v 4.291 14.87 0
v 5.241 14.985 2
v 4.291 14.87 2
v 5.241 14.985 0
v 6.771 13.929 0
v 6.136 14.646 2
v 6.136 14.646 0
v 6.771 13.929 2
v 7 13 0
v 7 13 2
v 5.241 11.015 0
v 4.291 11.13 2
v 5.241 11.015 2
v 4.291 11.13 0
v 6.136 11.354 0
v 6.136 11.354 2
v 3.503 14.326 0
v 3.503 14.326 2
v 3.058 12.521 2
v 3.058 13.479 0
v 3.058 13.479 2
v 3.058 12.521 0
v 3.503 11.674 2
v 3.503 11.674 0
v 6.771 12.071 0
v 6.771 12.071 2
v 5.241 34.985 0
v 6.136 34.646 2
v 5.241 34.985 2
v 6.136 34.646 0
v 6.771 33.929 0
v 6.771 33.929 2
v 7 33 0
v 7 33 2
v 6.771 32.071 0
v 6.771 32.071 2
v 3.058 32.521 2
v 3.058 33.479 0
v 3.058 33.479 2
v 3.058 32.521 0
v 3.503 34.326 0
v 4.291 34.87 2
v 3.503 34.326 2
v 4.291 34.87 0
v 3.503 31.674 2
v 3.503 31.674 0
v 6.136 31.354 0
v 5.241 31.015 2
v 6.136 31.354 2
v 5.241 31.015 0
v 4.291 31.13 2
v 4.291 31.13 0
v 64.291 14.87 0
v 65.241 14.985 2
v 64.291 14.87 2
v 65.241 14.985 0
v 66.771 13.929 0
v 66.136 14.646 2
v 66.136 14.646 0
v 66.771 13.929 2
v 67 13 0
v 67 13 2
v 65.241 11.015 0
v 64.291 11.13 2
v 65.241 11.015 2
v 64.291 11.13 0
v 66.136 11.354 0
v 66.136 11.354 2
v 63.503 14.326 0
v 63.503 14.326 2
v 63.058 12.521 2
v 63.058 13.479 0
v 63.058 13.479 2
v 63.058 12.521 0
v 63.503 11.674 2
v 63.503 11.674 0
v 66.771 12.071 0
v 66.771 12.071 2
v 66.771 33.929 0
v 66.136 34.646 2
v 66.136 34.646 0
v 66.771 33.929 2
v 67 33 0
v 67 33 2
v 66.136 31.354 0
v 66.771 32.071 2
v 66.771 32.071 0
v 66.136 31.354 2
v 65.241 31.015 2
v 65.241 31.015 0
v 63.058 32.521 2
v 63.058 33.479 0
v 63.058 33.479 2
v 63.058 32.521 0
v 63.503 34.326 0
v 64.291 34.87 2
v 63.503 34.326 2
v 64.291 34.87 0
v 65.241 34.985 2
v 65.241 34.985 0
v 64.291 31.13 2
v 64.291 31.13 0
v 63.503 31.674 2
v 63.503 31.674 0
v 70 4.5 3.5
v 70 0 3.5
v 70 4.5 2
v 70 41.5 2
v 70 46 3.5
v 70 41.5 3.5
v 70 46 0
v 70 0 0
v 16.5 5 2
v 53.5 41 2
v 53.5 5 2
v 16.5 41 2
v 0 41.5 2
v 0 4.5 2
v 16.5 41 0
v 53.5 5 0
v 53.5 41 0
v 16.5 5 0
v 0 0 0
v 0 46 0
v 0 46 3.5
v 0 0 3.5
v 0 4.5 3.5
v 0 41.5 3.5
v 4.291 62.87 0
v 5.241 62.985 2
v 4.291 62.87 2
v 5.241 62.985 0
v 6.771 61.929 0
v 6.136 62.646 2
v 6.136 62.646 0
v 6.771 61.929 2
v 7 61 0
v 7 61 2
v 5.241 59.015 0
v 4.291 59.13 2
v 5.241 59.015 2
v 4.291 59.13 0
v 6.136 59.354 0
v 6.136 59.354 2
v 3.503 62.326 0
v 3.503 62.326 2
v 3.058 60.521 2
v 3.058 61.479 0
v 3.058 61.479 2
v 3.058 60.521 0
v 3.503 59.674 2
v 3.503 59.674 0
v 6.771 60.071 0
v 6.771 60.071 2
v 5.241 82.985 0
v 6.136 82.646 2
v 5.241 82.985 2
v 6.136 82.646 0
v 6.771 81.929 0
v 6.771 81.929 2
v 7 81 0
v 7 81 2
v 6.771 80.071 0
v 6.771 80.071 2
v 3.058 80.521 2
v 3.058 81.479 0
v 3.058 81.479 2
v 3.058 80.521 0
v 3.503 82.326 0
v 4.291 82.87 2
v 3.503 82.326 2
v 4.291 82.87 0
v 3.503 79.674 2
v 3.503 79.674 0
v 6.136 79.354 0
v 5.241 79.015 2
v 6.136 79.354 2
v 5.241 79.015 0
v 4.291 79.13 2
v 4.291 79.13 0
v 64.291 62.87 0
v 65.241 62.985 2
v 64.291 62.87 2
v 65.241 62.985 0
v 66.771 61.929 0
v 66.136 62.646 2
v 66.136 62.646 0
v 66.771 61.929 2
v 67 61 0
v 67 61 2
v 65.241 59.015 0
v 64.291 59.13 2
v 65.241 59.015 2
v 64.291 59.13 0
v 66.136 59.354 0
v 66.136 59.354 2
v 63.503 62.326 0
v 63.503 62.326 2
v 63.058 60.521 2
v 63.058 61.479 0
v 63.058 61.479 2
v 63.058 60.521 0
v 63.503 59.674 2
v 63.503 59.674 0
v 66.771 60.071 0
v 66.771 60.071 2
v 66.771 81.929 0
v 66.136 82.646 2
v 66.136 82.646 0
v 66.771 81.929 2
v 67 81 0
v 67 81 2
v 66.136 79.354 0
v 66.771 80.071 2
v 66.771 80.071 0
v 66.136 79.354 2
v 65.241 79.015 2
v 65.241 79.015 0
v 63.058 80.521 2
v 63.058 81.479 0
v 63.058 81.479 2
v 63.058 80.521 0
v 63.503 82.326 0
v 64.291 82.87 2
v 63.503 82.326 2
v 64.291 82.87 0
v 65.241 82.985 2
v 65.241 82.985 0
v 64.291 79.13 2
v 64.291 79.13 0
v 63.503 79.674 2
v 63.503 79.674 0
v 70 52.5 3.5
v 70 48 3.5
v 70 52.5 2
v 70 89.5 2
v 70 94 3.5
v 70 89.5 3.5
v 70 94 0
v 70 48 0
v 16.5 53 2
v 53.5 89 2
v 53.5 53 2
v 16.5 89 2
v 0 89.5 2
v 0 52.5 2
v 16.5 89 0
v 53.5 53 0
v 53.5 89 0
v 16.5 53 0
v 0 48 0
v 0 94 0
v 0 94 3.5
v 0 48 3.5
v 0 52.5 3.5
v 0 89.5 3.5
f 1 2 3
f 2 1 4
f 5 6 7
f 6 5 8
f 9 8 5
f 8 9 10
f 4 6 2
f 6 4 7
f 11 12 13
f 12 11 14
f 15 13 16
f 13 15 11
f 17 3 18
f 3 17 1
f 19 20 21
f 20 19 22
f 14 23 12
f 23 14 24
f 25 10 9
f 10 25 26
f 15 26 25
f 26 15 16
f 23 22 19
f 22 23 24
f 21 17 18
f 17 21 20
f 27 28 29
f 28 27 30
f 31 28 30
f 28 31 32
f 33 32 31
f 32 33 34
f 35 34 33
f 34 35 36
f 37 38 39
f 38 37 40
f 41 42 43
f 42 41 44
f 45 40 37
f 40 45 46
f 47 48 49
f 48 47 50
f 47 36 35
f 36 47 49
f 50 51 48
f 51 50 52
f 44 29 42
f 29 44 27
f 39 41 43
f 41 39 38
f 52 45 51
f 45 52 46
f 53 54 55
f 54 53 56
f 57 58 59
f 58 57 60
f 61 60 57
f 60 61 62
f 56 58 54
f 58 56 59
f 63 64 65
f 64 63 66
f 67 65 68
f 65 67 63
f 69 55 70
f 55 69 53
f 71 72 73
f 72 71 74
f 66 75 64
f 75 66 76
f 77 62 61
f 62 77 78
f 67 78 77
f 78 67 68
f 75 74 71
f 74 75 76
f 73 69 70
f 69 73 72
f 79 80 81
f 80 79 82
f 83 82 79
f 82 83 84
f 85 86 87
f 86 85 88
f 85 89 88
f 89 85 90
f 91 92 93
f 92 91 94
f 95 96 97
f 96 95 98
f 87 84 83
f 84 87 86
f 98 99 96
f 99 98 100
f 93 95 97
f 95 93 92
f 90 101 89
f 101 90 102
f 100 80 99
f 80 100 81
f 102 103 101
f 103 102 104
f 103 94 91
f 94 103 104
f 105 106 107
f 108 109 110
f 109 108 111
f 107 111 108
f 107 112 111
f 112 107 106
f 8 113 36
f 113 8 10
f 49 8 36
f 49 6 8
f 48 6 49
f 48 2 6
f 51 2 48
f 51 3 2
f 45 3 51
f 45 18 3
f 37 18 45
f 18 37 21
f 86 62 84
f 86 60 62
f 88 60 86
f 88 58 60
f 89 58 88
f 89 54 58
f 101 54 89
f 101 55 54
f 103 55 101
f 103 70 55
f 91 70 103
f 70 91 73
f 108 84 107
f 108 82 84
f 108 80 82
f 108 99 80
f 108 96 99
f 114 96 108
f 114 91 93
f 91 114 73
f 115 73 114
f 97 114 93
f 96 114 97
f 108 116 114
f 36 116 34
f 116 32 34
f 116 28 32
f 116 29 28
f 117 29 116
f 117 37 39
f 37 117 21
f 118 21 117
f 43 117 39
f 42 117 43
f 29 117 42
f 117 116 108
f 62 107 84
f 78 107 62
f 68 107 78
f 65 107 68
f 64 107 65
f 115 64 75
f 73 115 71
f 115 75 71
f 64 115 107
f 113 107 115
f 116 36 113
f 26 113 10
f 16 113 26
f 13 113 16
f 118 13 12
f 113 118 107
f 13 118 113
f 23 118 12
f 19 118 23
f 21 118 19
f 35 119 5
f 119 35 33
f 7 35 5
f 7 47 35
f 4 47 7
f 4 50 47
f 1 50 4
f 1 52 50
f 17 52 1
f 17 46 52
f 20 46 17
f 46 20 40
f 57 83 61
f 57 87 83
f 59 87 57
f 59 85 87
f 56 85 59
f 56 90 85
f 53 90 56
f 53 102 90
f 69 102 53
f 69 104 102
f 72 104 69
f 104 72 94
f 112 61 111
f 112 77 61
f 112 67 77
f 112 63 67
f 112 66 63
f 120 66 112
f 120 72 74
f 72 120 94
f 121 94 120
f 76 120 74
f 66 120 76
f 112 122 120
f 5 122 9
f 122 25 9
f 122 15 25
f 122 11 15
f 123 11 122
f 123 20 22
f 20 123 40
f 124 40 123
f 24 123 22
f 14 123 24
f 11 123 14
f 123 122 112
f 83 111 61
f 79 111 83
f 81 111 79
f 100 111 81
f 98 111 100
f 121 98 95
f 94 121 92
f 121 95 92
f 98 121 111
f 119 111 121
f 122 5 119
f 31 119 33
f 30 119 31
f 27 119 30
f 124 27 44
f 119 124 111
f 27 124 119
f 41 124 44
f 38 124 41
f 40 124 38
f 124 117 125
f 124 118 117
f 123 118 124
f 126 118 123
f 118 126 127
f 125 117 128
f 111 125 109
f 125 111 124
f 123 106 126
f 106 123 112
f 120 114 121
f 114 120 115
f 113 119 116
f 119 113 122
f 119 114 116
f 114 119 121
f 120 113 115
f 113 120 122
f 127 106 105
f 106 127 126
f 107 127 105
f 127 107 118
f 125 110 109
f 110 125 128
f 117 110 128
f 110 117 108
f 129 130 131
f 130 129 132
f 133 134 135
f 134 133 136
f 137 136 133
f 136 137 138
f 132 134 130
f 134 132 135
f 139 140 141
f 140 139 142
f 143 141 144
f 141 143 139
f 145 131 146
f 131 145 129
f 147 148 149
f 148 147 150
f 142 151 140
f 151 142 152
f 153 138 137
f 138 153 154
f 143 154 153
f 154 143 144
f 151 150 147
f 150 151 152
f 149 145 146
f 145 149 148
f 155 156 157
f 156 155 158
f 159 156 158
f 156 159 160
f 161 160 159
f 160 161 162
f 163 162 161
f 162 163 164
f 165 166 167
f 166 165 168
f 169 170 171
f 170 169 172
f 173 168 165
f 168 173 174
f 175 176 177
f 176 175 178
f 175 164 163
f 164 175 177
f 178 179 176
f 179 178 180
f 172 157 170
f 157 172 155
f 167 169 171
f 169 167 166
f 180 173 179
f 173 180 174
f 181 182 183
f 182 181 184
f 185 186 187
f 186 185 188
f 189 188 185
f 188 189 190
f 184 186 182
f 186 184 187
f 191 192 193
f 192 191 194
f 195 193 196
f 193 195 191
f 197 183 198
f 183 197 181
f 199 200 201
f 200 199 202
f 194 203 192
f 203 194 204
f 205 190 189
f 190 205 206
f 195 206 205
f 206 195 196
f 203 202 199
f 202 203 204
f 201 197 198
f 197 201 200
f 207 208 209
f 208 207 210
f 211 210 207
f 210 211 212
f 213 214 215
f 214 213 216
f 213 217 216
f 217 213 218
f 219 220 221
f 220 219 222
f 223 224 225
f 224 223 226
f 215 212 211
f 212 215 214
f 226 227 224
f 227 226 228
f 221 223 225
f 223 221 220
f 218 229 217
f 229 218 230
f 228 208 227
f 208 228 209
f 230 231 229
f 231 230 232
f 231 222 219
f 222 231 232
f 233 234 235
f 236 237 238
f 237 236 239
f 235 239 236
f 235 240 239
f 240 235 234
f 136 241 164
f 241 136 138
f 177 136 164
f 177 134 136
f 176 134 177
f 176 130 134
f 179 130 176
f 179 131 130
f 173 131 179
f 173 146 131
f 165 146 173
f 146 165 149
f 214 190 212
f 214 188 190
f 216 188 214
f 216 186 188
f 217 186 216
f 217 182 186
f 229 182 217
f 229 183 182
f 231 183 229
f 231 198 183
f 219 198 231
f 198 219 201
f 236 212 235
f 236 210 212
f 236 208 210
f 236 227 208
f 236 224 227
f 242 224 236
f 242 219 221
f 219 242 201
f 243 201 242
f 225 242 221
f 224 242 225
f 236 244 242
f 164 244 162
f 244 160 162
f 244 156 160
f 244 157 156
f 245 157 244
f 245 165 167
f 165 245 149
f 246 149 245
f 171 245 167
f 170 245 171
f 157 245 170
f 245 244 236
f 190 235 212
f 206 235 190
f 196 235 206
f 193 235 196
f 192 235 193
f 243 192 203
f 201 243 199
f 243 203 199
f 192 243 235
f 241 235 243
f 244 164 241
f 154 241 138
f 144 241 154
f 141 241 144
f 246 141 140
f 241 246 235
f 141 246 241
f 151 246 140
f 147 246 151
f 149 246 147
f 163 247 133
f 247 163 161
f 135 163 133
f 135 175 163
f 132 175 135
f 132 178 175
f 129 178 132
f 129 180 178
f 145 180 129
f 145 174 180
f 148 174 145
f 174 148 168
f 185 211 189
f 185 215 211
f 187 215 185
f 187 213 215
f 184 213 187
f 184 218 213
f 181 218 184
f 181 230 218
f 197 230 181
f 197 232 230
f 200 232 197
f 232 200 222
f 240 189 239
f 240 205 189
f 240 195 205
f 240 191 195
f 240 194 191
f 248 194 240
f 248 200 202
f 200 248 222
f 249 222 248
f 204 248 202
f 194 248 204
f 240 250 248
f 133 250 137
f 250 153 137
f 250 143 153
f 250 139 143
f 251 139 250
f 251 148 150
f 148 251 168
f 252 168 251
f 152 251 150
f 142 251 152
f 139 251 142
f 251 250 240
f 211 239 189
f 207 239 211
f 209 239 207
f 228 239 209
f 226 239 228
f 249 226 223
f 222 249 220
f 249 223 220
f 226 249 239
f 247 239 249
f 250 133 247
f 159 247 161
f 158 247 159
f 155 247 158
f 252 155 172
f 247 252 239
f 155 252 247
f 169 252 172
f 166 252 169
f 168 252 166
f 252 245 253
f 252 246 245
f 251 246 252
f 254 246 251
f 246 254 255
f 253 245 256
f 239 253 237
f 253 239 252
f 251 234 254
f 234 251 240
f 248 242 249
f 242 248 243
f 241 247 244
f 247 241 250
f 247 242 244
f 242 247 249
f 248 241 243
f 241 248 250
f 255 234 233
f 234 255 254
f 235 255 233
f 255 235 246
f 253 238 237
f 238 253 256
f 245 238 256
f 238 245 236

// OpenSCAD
module cameraFrame()
{
  difference()
  {
    cube([42+2*14, 36+2*5, 2]);
    // center window
    translate([((42+2*14)-(43-6))/2, ((36+2*5)-36)/2, 0])
      cube([43-6, 36, 2]);
    // mount holes
    translate([42+2*14, 36+2*5, 0]/2)
      for(dx=[-1, +1])
        for(dy=[-1, +1])
          translate([dx*((42+2*14)/2-5), dy*(36/2-8), -1])
            cylinder(r=(3+1)/2, h=2+2, $fs=1);
  }
  // support shelfs
  for(dy=[0, 36+2*5-4.5])
    translate([0, dy, 2])
      cube([42+2*14, 4.5, 1.5]);
  
}


for(i=[0:1])
  translate([0, i*48, 0])
    cameraFrame();
